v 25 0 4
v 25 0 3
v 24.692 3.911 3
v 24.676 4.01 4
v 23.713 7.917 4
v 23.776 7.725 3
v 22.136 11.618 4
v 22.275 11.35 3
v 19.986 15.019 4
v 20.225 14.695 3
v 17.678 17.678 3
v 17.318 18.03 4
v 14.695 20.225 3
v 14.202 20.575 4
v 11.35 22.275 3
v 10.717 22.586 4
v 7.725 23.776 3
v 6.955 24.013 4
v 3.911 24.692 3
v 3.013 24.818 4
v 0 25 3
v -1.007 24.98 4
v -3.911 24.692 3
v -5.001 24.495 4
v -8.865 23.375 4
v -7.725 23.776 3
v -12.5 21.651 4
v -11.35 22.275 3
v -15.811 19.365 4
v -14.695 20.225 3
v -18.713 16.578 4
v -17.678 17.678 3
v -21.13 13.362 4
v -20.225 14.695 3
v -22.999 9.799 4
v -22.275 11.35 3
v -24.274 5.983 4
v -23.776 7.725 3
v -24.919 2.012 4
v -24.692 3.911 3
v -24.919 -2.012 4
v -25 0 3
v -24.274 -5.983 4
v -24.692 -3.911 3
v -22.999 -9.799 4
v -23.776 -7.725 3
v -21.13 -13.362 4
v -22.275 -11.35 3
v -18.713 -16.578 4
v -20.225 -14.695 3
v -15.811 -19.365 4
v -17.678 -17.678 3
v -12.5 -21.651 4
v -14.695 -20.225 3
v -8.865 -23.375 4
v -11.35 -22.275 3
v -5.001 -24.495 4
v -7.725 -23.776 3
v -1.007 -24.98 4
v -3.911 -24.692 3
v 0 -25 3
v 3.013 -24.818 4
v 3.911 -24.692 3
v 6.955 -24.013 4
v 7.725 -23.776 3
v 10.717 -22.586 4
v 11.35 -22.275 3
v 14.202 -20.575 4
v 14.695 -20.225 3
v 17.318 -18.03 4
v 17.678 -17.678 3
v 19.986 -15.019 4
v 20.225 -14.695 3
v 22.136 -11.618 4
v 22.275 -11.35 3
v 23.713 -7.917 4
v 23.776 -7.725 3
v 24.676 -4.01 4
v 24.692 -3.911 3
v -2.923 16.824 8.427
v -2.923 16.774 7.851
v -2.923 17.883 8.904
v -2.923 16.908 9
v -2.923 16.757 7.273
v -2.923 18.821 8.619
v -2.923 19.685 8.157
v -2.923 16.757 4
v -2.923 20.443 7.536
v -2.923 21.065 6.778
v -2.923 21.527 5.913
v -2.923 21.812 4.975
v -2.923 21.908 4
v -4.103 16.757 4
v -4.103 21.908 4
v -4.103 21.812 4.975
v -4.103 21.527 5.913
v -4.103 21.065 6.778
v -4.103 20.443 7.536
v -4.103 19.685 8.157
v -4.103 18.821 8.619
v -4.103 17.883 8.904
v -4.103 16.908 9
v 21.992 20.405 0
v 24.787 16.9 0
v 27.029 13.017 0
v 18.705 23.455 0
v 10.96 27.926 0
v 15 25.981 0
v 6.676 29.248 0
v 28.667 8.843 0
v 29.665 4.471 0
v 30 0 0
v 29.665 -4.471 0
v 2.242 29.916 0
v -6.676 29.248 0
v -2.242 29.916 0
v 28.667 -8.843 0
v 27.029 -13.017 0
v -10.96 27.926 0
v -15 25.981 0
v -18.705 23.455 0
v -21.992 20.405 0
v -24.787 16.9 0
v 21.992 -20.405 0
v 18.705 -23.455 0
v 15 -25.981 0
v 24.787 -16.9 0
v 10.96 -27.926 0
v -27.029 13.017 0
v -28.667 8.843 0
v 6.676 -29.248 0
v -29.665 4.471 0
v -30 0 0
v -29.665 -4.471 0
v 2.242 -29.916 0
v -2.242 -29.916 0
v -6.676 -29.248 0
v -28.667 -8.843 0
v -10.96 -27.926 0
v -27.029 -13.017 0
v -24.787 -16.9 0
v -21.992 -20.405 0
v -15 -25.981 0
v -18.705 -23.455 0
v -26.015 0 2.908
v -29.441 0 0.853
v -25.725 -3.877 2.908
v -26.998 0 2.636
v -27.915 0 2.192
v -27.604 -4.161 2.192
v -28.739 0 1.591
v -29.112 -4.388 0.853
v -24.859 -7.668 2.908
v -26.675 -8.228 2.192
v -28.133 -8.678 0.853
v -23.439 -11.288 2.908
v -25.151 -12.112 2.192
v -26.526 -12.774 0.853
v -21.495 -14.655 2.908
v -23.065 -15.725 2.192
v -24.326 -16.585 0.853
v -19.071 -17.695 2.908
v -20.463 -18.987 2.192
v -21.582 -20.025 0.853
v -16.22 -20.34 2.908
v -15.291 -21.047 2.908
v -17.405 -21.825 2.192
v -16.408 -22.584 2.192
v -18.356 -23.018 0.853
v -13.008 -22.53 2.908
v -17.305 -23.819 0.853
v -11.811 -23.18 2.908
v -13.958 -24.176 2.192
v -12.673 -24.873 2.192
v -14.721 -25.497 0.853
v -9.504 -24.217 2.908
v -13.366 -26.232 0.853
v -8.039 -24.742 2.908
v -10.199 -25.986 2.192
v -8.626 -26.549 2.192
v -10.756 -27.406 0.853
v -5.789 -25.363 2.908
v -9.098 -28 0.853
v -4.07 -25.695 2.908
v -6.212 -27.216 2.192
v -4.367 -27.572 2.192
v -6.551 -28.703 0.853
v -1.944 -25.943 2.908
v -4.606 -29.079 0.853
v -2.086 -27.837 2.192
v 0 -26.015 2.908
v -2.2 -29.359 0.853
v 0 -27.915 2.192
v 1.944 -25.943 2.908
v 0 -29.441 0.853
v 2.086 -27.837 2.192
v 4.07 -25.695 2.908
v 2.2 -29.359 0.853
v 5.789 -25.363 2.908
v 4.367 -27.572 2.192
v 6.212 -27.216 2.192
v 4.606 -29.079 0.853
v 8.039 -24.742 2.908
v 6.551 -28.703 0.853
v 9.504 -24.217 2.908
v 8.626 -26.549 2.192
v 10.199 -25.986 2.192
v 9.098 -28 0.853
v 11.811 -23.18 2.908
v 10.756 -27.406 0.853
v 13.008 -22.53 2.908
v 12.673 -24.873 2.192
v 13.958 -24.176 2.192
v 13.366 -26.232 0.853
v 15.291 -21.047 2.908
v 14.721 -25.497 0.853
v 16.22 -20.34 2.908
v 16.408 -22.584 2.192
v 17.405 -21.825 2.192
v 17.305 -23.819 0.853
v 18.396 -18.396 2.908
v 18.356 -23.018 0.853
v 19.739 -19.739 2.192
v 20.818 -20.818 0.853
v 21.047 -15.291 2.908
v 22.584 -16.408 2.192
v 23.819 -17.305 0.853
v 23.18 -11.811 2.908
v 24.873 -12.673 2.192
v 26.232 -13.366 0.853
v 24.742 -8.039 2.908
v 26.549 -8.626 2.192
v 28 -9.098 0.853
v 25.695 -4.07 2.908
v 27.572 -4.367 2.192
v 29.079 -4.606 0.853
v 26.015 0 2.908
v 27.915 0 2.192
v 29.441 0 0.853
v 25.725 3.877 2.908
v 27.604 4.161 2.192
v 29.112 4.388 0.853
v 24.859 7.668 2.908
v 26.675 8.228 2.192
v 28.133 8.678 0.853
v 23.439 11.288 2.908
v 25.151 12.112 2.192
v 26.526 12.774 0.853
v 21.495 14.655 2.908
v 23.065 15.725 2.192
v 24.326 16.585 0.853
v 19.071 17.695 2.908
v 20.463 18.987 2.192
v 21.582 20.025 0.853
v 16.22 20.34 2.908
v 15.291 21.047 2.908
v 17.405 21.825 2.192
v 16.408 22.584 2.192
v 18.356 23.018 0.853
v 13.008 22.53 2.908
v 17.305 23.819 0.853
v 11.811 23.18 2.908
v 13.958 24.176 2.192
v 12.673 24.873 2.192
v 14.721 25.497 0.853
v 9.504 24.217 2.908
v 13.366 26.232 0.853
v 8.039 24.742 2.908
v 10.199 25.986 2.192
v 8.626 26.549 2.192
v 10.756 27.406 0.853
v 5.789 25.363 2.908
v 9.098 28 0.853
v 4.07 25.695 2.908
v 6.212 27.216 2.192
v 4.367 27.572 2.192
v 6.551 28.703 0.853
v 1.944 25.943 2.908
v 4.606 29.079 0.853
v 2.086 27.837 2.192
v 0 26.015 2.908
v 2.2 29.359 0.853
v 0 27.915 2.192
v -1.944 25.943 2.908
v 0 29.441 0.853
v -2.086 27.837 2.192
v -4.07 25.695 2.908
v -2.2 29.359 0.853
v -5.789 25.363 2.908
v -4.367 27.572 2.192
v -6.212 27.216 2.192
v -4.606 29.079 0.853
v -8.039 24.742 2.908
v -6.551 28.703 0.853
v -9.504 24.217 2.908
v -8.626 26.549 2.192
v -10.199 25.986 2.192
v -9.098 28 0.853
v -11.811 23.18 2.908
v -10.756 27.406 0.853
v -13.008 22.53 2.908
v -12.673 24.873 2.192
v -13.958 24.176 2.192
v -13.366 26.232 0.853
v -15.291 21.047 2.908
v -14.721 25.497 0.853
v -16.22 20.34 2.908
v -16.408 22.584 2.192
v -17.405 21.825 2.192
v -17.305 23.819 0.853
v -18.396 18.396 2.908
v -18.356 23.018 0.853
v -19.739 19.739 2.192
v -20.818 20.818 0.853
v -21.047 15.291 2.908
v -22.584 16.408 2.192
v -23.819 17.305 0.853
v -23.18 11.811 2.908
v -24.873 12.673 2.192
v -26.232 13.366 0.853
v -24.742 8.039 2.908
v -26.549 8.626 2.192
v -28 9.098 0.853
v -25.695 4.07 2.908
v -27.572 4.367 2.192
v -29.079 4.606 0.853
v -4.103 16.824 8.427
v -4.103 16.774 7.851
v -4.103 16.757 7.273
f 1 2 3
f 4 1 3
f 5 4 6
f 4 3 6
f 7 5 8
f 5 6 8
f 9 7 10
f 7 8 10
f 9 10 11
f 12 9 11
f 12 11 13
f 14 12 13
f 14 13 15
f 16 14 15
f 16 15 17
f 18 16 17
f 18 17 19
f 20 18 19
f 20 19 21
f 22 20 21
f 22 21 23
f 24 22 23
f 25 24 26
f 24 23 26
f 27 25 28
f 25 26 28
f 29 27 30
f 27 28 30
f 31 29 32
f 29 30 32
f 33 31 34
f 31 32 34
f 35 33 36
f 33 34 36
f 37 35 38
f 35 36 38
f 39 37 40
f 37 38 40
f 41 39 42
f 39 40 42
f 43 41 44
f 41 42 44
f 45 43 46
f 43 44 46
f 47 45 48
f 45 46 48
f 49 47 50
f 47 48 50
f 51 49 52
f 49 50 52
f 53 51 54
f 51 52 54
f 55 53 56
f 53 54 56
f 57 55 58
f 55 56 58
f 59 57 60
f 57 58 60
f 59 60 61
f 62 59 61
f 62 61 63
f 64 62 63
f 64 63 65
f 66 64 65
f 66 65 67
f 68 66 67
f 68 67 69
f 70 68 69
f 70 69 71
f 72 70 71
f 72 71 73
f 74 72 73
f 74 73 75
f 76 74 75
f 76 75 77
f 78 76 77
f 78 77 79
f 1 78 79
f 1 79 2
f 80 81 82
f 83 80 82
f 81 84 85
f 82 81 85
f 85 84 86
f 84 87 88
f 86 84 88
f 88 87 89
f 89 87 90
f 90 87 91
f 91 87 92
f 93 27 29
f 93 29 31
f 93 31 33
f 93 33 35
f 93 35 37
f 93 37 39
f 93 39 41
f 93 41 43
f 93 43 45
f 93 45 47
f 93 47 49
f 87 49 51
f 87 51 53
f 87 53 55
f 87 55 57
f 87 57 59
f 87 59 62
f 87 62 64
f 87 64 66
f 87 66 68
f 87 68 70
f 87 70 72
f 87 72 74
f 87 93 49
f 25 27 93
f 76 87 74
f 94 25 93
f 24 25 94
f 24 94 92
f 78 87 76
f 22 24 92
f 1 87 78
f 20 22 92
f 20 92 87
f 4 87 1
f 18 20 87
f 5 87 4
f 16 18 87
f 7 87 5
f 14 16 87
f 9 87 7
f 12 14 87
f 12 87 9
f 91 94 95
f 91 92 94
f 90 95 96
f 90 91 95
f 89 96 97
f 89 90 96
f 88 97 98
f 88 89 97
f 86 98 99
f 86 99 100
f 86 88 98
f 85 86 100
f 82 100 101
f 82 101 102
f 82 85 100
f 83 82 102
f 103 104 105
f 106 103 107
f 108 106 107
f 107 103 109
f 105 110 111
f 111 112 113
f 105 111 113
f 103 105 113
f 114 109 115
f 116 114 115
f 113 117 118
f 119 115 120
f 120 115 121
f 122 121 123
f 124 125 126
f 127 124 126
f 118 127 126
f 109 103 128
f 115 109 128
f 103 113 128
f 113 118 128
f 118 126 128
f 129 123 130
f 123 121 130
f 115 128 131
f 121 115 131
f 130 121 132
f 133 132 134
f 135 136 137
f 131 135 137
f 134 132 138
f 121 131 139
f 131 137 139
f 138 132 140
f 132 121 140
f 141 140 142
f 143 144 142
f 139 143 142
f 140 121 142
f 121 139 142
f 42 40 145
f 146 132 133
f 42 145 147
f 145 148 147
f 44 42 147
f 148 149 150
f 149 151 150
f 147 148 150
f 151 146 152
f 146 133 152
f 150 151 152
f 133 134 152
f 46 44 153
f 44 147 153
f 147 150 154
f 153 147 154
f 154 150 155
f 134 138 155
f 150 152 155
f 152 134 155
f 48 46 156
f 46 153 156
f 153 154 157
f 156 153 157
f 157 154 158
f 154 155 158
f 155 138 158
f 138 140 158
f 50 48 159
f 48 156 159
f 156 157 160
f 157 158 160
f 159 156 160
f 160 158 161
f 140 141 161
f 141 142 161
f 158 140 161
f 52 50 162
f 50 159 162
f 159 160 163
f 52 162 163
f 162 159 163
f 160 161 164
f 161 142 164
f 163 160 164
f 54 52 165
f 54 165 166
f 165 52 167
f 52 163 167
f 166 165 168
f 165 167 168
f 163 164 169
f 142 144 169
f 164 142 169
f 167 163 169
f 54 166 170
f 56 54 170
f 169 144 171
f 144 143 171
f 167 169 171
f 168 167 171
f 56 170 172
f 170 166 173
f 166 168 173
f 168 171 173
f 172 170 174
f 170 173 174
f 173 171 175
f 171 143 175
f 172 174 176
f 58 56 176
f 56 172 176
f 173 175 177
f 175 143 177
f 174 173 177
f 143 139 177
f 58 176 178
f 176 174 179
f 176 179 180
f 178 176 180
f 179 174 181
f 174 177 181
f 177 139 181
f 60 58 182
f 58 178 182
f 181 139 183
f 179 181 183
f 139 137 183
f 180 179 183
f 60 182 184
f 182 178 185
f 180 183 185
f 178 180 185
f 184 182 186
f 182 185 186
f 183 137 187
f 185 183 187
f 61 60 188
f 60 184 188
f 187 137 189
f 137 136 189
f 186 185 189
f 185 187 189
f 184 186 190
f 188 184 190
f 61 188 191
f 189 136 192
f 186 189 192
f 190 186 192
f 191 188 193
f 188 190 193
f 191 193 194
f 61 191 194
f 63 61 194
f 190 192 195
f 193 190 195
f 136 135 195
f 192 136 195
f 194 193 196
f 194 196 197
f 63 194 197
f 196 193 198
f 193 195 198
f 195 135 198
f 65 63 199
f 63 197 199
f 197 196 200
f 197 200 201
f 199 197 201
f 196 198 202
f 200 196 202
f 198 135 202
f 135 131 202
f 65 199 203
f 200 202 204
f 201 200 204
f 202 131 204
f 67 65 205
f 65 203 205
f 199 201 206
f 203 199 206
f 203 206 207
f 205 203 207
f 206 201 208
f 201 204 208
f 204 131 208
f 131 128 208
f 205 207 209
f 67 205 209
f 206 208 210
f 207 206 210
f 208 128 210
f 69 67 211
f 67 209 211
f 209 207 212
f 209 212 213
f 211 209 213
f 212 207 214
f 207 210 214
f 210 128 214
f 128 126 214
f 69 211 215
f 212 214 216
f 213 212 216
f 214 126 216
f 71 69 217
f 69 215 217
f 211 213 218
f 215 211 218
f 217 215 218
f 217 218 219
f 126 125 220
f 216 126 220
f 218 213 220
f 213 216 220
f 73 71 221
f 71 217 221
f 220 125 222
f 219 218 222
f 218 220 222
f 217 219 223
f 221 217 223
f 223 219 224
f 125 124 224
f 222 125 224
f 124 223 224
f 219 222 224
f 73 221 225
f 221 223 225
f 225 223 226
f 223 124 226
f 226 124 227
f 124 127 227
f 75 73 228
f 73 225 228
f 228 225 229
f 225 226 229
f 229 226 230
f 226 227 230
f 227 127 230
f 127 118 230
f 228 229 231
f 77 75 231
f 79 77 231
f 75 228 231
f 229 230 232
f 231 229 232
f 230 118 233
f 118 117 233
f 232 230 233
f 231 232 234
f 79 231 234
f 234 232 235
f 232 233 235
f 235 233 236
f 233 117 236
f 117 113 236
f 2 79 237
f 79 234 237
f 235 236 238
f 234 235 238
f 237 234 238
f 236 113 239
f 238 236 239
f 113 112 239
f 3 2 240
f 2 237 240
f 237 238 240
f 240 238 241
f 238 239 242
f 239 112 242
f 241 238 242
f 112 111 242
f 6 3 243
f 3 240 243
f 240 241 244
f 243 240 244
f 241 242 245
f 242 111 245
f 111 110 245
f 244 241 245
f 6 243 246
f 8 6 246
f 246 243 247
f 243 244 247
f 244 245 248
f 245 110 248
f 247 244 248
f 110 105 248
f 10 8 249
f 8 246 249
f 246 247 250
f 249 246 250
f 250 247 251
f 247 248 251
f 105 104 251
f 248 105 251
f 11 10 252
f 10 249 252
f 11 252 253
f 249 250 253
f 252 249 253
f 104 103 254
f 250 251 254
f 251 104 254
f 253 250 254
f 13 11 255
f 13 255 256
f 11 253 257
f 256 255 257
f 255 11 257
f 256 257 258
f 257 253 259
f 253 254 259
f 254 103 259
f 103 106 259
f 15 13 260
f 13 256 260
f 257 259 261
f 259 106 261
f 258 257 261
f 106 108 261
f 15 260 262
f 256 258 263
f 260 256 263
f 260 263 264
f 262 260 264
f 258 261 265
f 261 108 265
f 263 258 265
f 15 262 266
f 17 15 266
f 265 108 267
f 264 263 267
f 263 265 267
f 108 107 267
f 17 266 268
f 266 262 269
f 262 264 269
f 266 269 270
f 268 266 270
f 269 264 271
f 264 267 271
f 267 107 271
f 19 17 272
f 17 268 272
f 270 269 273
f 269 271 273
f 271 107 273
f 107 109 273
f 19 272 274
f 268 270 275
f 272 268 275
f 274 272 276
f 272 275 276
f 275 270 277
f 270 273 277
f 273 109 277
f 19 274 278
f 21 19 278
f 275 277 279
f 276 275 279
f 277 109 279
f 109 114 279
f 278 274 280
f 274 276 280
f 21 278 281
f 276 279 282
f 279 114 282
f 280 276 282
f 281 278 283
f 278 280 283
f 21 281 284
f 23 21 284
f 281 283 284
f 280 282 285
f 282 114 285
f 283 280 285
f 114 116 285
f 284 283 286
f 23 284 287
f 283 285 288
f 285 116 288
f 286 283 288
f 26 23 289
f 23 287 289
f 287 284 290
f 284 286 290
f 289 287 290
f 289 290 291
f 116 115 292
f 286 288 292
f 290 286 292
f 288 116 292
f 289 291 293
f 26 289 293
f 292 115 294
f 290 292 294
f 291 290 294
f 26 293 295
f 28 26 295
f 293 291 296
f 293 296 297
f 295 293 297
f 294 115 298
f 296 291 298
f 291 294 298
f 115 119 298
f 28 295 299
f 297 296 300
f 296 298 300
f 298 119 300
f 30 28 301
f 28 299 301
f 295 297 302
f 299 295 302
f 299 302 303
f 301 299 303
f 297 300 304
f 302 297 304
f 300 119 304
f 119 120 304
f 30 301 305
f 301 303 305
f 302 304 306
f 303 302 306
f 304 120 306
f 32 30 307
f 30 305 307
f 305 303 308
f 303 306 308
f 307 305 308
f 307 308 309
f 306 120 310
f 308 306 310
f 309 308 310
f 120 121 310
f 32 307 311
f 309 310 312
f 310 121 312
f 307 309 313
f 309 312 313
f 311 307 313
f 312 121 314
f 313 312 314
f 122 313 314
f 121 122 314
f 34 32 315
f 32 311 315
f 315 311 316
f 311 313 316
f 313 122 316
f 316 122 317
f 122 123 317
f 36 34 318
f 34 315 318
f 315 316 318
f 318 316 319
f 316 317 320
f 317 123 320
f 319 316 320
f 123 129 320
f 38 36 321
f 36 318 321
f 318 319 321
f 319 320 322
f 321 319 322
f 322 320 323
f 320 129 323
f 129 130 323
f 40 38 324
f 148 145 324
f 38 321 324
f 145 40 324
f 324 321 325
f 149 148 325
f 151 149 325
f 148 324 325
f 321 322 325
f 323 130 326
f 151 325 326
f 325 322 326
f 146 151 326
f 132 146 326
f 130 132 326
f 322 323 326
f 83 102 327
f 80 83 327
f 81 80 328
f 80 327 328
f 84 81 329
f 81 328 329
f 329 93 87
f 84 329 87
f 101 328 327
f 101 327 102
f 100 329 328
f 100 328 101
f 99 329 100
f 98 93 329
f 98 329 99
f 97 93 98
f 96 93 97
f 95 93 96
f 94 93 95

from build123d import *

# Parameters (mm, degrees)
F3_R        = 25
F4_DEPTH    = 1
F5_W        = 1.1802830268
F5_H        = 5.150327459
F6_DEPTH    = 5
F7_R        = 4.99999
F8_T1_DEPTH = 9.8176261194


# Not quite as in the source:
# - a fillet or chamfer that OpenCascade refuses, or shapes differently, is made with other operations: its cross-section is extruded or revolved along the edge and cut away or added
# - a fillet or chamfer is up to 0.001 mm smaller than in the source, because OpenCascade refuses the exact size


with BuildPart() as f1:
    # F0 (on Front) → F1 (revolve)
    with BuildSketch(Plane.XZ):
        with BuildLine():
            Line((-30, 0), (0, 0))
            Line((0, 0), (0, 3))
            Line((0, 3), (-25, 3))
            ThreePointArc((-25, 3), (-27.9154759474, 2.1924599124), (-30, 0))
        make_face()
    revolve(axis=Axis((0, 0, 1.5), (0, 0, 1)))

    # F3 (on face) → F4 (join)
    with BuildSketch(Plane.XY.offset(3)):
        Circle(F3_R)
    extrude(amount=F4_DEPTH)

    # F5 (on face) → F6 (join)
    with BuildSketch(Plane.XY.offset(4)):
        with Locations((-3.5133393249, 19.3324619904)):
            Rectangle(F5_W, F5_H)
    extrude(amount=F6_DEPTH)

    # F7 (radius 5 in the source; OpenCascade refuses exactly that, so slightly less here)
    f7_edges = [f1.edges().sort_by_distance(p)[0] for p in [
        (-3.513339, 21.907626, 9),
    ]]
    fillet(f7_edges, radius=F7_R)

    # F8: fillet of radius 10 on 1 edges, made by hand

    # F8_s2 → F8_t1 (cut)
    with BuildSketch(Plane.YZ.offset(-8.4221523845)):
        with BuildLine():
            ThreePointArc((16.9076357199, 9), (16.7949535216, 8.1395303981), (16.7572982609, 7.2725313815))
            Line((16.7572982609, 7.2725313815), (16.7572982609, 9))
            Line((16.7572982609, 9), (16.9076357199, 9))
        make_face()
    extrude(amount=F8_T1_DEPTH, mode=Mode.SUBTRACT)


solid = f1.part
